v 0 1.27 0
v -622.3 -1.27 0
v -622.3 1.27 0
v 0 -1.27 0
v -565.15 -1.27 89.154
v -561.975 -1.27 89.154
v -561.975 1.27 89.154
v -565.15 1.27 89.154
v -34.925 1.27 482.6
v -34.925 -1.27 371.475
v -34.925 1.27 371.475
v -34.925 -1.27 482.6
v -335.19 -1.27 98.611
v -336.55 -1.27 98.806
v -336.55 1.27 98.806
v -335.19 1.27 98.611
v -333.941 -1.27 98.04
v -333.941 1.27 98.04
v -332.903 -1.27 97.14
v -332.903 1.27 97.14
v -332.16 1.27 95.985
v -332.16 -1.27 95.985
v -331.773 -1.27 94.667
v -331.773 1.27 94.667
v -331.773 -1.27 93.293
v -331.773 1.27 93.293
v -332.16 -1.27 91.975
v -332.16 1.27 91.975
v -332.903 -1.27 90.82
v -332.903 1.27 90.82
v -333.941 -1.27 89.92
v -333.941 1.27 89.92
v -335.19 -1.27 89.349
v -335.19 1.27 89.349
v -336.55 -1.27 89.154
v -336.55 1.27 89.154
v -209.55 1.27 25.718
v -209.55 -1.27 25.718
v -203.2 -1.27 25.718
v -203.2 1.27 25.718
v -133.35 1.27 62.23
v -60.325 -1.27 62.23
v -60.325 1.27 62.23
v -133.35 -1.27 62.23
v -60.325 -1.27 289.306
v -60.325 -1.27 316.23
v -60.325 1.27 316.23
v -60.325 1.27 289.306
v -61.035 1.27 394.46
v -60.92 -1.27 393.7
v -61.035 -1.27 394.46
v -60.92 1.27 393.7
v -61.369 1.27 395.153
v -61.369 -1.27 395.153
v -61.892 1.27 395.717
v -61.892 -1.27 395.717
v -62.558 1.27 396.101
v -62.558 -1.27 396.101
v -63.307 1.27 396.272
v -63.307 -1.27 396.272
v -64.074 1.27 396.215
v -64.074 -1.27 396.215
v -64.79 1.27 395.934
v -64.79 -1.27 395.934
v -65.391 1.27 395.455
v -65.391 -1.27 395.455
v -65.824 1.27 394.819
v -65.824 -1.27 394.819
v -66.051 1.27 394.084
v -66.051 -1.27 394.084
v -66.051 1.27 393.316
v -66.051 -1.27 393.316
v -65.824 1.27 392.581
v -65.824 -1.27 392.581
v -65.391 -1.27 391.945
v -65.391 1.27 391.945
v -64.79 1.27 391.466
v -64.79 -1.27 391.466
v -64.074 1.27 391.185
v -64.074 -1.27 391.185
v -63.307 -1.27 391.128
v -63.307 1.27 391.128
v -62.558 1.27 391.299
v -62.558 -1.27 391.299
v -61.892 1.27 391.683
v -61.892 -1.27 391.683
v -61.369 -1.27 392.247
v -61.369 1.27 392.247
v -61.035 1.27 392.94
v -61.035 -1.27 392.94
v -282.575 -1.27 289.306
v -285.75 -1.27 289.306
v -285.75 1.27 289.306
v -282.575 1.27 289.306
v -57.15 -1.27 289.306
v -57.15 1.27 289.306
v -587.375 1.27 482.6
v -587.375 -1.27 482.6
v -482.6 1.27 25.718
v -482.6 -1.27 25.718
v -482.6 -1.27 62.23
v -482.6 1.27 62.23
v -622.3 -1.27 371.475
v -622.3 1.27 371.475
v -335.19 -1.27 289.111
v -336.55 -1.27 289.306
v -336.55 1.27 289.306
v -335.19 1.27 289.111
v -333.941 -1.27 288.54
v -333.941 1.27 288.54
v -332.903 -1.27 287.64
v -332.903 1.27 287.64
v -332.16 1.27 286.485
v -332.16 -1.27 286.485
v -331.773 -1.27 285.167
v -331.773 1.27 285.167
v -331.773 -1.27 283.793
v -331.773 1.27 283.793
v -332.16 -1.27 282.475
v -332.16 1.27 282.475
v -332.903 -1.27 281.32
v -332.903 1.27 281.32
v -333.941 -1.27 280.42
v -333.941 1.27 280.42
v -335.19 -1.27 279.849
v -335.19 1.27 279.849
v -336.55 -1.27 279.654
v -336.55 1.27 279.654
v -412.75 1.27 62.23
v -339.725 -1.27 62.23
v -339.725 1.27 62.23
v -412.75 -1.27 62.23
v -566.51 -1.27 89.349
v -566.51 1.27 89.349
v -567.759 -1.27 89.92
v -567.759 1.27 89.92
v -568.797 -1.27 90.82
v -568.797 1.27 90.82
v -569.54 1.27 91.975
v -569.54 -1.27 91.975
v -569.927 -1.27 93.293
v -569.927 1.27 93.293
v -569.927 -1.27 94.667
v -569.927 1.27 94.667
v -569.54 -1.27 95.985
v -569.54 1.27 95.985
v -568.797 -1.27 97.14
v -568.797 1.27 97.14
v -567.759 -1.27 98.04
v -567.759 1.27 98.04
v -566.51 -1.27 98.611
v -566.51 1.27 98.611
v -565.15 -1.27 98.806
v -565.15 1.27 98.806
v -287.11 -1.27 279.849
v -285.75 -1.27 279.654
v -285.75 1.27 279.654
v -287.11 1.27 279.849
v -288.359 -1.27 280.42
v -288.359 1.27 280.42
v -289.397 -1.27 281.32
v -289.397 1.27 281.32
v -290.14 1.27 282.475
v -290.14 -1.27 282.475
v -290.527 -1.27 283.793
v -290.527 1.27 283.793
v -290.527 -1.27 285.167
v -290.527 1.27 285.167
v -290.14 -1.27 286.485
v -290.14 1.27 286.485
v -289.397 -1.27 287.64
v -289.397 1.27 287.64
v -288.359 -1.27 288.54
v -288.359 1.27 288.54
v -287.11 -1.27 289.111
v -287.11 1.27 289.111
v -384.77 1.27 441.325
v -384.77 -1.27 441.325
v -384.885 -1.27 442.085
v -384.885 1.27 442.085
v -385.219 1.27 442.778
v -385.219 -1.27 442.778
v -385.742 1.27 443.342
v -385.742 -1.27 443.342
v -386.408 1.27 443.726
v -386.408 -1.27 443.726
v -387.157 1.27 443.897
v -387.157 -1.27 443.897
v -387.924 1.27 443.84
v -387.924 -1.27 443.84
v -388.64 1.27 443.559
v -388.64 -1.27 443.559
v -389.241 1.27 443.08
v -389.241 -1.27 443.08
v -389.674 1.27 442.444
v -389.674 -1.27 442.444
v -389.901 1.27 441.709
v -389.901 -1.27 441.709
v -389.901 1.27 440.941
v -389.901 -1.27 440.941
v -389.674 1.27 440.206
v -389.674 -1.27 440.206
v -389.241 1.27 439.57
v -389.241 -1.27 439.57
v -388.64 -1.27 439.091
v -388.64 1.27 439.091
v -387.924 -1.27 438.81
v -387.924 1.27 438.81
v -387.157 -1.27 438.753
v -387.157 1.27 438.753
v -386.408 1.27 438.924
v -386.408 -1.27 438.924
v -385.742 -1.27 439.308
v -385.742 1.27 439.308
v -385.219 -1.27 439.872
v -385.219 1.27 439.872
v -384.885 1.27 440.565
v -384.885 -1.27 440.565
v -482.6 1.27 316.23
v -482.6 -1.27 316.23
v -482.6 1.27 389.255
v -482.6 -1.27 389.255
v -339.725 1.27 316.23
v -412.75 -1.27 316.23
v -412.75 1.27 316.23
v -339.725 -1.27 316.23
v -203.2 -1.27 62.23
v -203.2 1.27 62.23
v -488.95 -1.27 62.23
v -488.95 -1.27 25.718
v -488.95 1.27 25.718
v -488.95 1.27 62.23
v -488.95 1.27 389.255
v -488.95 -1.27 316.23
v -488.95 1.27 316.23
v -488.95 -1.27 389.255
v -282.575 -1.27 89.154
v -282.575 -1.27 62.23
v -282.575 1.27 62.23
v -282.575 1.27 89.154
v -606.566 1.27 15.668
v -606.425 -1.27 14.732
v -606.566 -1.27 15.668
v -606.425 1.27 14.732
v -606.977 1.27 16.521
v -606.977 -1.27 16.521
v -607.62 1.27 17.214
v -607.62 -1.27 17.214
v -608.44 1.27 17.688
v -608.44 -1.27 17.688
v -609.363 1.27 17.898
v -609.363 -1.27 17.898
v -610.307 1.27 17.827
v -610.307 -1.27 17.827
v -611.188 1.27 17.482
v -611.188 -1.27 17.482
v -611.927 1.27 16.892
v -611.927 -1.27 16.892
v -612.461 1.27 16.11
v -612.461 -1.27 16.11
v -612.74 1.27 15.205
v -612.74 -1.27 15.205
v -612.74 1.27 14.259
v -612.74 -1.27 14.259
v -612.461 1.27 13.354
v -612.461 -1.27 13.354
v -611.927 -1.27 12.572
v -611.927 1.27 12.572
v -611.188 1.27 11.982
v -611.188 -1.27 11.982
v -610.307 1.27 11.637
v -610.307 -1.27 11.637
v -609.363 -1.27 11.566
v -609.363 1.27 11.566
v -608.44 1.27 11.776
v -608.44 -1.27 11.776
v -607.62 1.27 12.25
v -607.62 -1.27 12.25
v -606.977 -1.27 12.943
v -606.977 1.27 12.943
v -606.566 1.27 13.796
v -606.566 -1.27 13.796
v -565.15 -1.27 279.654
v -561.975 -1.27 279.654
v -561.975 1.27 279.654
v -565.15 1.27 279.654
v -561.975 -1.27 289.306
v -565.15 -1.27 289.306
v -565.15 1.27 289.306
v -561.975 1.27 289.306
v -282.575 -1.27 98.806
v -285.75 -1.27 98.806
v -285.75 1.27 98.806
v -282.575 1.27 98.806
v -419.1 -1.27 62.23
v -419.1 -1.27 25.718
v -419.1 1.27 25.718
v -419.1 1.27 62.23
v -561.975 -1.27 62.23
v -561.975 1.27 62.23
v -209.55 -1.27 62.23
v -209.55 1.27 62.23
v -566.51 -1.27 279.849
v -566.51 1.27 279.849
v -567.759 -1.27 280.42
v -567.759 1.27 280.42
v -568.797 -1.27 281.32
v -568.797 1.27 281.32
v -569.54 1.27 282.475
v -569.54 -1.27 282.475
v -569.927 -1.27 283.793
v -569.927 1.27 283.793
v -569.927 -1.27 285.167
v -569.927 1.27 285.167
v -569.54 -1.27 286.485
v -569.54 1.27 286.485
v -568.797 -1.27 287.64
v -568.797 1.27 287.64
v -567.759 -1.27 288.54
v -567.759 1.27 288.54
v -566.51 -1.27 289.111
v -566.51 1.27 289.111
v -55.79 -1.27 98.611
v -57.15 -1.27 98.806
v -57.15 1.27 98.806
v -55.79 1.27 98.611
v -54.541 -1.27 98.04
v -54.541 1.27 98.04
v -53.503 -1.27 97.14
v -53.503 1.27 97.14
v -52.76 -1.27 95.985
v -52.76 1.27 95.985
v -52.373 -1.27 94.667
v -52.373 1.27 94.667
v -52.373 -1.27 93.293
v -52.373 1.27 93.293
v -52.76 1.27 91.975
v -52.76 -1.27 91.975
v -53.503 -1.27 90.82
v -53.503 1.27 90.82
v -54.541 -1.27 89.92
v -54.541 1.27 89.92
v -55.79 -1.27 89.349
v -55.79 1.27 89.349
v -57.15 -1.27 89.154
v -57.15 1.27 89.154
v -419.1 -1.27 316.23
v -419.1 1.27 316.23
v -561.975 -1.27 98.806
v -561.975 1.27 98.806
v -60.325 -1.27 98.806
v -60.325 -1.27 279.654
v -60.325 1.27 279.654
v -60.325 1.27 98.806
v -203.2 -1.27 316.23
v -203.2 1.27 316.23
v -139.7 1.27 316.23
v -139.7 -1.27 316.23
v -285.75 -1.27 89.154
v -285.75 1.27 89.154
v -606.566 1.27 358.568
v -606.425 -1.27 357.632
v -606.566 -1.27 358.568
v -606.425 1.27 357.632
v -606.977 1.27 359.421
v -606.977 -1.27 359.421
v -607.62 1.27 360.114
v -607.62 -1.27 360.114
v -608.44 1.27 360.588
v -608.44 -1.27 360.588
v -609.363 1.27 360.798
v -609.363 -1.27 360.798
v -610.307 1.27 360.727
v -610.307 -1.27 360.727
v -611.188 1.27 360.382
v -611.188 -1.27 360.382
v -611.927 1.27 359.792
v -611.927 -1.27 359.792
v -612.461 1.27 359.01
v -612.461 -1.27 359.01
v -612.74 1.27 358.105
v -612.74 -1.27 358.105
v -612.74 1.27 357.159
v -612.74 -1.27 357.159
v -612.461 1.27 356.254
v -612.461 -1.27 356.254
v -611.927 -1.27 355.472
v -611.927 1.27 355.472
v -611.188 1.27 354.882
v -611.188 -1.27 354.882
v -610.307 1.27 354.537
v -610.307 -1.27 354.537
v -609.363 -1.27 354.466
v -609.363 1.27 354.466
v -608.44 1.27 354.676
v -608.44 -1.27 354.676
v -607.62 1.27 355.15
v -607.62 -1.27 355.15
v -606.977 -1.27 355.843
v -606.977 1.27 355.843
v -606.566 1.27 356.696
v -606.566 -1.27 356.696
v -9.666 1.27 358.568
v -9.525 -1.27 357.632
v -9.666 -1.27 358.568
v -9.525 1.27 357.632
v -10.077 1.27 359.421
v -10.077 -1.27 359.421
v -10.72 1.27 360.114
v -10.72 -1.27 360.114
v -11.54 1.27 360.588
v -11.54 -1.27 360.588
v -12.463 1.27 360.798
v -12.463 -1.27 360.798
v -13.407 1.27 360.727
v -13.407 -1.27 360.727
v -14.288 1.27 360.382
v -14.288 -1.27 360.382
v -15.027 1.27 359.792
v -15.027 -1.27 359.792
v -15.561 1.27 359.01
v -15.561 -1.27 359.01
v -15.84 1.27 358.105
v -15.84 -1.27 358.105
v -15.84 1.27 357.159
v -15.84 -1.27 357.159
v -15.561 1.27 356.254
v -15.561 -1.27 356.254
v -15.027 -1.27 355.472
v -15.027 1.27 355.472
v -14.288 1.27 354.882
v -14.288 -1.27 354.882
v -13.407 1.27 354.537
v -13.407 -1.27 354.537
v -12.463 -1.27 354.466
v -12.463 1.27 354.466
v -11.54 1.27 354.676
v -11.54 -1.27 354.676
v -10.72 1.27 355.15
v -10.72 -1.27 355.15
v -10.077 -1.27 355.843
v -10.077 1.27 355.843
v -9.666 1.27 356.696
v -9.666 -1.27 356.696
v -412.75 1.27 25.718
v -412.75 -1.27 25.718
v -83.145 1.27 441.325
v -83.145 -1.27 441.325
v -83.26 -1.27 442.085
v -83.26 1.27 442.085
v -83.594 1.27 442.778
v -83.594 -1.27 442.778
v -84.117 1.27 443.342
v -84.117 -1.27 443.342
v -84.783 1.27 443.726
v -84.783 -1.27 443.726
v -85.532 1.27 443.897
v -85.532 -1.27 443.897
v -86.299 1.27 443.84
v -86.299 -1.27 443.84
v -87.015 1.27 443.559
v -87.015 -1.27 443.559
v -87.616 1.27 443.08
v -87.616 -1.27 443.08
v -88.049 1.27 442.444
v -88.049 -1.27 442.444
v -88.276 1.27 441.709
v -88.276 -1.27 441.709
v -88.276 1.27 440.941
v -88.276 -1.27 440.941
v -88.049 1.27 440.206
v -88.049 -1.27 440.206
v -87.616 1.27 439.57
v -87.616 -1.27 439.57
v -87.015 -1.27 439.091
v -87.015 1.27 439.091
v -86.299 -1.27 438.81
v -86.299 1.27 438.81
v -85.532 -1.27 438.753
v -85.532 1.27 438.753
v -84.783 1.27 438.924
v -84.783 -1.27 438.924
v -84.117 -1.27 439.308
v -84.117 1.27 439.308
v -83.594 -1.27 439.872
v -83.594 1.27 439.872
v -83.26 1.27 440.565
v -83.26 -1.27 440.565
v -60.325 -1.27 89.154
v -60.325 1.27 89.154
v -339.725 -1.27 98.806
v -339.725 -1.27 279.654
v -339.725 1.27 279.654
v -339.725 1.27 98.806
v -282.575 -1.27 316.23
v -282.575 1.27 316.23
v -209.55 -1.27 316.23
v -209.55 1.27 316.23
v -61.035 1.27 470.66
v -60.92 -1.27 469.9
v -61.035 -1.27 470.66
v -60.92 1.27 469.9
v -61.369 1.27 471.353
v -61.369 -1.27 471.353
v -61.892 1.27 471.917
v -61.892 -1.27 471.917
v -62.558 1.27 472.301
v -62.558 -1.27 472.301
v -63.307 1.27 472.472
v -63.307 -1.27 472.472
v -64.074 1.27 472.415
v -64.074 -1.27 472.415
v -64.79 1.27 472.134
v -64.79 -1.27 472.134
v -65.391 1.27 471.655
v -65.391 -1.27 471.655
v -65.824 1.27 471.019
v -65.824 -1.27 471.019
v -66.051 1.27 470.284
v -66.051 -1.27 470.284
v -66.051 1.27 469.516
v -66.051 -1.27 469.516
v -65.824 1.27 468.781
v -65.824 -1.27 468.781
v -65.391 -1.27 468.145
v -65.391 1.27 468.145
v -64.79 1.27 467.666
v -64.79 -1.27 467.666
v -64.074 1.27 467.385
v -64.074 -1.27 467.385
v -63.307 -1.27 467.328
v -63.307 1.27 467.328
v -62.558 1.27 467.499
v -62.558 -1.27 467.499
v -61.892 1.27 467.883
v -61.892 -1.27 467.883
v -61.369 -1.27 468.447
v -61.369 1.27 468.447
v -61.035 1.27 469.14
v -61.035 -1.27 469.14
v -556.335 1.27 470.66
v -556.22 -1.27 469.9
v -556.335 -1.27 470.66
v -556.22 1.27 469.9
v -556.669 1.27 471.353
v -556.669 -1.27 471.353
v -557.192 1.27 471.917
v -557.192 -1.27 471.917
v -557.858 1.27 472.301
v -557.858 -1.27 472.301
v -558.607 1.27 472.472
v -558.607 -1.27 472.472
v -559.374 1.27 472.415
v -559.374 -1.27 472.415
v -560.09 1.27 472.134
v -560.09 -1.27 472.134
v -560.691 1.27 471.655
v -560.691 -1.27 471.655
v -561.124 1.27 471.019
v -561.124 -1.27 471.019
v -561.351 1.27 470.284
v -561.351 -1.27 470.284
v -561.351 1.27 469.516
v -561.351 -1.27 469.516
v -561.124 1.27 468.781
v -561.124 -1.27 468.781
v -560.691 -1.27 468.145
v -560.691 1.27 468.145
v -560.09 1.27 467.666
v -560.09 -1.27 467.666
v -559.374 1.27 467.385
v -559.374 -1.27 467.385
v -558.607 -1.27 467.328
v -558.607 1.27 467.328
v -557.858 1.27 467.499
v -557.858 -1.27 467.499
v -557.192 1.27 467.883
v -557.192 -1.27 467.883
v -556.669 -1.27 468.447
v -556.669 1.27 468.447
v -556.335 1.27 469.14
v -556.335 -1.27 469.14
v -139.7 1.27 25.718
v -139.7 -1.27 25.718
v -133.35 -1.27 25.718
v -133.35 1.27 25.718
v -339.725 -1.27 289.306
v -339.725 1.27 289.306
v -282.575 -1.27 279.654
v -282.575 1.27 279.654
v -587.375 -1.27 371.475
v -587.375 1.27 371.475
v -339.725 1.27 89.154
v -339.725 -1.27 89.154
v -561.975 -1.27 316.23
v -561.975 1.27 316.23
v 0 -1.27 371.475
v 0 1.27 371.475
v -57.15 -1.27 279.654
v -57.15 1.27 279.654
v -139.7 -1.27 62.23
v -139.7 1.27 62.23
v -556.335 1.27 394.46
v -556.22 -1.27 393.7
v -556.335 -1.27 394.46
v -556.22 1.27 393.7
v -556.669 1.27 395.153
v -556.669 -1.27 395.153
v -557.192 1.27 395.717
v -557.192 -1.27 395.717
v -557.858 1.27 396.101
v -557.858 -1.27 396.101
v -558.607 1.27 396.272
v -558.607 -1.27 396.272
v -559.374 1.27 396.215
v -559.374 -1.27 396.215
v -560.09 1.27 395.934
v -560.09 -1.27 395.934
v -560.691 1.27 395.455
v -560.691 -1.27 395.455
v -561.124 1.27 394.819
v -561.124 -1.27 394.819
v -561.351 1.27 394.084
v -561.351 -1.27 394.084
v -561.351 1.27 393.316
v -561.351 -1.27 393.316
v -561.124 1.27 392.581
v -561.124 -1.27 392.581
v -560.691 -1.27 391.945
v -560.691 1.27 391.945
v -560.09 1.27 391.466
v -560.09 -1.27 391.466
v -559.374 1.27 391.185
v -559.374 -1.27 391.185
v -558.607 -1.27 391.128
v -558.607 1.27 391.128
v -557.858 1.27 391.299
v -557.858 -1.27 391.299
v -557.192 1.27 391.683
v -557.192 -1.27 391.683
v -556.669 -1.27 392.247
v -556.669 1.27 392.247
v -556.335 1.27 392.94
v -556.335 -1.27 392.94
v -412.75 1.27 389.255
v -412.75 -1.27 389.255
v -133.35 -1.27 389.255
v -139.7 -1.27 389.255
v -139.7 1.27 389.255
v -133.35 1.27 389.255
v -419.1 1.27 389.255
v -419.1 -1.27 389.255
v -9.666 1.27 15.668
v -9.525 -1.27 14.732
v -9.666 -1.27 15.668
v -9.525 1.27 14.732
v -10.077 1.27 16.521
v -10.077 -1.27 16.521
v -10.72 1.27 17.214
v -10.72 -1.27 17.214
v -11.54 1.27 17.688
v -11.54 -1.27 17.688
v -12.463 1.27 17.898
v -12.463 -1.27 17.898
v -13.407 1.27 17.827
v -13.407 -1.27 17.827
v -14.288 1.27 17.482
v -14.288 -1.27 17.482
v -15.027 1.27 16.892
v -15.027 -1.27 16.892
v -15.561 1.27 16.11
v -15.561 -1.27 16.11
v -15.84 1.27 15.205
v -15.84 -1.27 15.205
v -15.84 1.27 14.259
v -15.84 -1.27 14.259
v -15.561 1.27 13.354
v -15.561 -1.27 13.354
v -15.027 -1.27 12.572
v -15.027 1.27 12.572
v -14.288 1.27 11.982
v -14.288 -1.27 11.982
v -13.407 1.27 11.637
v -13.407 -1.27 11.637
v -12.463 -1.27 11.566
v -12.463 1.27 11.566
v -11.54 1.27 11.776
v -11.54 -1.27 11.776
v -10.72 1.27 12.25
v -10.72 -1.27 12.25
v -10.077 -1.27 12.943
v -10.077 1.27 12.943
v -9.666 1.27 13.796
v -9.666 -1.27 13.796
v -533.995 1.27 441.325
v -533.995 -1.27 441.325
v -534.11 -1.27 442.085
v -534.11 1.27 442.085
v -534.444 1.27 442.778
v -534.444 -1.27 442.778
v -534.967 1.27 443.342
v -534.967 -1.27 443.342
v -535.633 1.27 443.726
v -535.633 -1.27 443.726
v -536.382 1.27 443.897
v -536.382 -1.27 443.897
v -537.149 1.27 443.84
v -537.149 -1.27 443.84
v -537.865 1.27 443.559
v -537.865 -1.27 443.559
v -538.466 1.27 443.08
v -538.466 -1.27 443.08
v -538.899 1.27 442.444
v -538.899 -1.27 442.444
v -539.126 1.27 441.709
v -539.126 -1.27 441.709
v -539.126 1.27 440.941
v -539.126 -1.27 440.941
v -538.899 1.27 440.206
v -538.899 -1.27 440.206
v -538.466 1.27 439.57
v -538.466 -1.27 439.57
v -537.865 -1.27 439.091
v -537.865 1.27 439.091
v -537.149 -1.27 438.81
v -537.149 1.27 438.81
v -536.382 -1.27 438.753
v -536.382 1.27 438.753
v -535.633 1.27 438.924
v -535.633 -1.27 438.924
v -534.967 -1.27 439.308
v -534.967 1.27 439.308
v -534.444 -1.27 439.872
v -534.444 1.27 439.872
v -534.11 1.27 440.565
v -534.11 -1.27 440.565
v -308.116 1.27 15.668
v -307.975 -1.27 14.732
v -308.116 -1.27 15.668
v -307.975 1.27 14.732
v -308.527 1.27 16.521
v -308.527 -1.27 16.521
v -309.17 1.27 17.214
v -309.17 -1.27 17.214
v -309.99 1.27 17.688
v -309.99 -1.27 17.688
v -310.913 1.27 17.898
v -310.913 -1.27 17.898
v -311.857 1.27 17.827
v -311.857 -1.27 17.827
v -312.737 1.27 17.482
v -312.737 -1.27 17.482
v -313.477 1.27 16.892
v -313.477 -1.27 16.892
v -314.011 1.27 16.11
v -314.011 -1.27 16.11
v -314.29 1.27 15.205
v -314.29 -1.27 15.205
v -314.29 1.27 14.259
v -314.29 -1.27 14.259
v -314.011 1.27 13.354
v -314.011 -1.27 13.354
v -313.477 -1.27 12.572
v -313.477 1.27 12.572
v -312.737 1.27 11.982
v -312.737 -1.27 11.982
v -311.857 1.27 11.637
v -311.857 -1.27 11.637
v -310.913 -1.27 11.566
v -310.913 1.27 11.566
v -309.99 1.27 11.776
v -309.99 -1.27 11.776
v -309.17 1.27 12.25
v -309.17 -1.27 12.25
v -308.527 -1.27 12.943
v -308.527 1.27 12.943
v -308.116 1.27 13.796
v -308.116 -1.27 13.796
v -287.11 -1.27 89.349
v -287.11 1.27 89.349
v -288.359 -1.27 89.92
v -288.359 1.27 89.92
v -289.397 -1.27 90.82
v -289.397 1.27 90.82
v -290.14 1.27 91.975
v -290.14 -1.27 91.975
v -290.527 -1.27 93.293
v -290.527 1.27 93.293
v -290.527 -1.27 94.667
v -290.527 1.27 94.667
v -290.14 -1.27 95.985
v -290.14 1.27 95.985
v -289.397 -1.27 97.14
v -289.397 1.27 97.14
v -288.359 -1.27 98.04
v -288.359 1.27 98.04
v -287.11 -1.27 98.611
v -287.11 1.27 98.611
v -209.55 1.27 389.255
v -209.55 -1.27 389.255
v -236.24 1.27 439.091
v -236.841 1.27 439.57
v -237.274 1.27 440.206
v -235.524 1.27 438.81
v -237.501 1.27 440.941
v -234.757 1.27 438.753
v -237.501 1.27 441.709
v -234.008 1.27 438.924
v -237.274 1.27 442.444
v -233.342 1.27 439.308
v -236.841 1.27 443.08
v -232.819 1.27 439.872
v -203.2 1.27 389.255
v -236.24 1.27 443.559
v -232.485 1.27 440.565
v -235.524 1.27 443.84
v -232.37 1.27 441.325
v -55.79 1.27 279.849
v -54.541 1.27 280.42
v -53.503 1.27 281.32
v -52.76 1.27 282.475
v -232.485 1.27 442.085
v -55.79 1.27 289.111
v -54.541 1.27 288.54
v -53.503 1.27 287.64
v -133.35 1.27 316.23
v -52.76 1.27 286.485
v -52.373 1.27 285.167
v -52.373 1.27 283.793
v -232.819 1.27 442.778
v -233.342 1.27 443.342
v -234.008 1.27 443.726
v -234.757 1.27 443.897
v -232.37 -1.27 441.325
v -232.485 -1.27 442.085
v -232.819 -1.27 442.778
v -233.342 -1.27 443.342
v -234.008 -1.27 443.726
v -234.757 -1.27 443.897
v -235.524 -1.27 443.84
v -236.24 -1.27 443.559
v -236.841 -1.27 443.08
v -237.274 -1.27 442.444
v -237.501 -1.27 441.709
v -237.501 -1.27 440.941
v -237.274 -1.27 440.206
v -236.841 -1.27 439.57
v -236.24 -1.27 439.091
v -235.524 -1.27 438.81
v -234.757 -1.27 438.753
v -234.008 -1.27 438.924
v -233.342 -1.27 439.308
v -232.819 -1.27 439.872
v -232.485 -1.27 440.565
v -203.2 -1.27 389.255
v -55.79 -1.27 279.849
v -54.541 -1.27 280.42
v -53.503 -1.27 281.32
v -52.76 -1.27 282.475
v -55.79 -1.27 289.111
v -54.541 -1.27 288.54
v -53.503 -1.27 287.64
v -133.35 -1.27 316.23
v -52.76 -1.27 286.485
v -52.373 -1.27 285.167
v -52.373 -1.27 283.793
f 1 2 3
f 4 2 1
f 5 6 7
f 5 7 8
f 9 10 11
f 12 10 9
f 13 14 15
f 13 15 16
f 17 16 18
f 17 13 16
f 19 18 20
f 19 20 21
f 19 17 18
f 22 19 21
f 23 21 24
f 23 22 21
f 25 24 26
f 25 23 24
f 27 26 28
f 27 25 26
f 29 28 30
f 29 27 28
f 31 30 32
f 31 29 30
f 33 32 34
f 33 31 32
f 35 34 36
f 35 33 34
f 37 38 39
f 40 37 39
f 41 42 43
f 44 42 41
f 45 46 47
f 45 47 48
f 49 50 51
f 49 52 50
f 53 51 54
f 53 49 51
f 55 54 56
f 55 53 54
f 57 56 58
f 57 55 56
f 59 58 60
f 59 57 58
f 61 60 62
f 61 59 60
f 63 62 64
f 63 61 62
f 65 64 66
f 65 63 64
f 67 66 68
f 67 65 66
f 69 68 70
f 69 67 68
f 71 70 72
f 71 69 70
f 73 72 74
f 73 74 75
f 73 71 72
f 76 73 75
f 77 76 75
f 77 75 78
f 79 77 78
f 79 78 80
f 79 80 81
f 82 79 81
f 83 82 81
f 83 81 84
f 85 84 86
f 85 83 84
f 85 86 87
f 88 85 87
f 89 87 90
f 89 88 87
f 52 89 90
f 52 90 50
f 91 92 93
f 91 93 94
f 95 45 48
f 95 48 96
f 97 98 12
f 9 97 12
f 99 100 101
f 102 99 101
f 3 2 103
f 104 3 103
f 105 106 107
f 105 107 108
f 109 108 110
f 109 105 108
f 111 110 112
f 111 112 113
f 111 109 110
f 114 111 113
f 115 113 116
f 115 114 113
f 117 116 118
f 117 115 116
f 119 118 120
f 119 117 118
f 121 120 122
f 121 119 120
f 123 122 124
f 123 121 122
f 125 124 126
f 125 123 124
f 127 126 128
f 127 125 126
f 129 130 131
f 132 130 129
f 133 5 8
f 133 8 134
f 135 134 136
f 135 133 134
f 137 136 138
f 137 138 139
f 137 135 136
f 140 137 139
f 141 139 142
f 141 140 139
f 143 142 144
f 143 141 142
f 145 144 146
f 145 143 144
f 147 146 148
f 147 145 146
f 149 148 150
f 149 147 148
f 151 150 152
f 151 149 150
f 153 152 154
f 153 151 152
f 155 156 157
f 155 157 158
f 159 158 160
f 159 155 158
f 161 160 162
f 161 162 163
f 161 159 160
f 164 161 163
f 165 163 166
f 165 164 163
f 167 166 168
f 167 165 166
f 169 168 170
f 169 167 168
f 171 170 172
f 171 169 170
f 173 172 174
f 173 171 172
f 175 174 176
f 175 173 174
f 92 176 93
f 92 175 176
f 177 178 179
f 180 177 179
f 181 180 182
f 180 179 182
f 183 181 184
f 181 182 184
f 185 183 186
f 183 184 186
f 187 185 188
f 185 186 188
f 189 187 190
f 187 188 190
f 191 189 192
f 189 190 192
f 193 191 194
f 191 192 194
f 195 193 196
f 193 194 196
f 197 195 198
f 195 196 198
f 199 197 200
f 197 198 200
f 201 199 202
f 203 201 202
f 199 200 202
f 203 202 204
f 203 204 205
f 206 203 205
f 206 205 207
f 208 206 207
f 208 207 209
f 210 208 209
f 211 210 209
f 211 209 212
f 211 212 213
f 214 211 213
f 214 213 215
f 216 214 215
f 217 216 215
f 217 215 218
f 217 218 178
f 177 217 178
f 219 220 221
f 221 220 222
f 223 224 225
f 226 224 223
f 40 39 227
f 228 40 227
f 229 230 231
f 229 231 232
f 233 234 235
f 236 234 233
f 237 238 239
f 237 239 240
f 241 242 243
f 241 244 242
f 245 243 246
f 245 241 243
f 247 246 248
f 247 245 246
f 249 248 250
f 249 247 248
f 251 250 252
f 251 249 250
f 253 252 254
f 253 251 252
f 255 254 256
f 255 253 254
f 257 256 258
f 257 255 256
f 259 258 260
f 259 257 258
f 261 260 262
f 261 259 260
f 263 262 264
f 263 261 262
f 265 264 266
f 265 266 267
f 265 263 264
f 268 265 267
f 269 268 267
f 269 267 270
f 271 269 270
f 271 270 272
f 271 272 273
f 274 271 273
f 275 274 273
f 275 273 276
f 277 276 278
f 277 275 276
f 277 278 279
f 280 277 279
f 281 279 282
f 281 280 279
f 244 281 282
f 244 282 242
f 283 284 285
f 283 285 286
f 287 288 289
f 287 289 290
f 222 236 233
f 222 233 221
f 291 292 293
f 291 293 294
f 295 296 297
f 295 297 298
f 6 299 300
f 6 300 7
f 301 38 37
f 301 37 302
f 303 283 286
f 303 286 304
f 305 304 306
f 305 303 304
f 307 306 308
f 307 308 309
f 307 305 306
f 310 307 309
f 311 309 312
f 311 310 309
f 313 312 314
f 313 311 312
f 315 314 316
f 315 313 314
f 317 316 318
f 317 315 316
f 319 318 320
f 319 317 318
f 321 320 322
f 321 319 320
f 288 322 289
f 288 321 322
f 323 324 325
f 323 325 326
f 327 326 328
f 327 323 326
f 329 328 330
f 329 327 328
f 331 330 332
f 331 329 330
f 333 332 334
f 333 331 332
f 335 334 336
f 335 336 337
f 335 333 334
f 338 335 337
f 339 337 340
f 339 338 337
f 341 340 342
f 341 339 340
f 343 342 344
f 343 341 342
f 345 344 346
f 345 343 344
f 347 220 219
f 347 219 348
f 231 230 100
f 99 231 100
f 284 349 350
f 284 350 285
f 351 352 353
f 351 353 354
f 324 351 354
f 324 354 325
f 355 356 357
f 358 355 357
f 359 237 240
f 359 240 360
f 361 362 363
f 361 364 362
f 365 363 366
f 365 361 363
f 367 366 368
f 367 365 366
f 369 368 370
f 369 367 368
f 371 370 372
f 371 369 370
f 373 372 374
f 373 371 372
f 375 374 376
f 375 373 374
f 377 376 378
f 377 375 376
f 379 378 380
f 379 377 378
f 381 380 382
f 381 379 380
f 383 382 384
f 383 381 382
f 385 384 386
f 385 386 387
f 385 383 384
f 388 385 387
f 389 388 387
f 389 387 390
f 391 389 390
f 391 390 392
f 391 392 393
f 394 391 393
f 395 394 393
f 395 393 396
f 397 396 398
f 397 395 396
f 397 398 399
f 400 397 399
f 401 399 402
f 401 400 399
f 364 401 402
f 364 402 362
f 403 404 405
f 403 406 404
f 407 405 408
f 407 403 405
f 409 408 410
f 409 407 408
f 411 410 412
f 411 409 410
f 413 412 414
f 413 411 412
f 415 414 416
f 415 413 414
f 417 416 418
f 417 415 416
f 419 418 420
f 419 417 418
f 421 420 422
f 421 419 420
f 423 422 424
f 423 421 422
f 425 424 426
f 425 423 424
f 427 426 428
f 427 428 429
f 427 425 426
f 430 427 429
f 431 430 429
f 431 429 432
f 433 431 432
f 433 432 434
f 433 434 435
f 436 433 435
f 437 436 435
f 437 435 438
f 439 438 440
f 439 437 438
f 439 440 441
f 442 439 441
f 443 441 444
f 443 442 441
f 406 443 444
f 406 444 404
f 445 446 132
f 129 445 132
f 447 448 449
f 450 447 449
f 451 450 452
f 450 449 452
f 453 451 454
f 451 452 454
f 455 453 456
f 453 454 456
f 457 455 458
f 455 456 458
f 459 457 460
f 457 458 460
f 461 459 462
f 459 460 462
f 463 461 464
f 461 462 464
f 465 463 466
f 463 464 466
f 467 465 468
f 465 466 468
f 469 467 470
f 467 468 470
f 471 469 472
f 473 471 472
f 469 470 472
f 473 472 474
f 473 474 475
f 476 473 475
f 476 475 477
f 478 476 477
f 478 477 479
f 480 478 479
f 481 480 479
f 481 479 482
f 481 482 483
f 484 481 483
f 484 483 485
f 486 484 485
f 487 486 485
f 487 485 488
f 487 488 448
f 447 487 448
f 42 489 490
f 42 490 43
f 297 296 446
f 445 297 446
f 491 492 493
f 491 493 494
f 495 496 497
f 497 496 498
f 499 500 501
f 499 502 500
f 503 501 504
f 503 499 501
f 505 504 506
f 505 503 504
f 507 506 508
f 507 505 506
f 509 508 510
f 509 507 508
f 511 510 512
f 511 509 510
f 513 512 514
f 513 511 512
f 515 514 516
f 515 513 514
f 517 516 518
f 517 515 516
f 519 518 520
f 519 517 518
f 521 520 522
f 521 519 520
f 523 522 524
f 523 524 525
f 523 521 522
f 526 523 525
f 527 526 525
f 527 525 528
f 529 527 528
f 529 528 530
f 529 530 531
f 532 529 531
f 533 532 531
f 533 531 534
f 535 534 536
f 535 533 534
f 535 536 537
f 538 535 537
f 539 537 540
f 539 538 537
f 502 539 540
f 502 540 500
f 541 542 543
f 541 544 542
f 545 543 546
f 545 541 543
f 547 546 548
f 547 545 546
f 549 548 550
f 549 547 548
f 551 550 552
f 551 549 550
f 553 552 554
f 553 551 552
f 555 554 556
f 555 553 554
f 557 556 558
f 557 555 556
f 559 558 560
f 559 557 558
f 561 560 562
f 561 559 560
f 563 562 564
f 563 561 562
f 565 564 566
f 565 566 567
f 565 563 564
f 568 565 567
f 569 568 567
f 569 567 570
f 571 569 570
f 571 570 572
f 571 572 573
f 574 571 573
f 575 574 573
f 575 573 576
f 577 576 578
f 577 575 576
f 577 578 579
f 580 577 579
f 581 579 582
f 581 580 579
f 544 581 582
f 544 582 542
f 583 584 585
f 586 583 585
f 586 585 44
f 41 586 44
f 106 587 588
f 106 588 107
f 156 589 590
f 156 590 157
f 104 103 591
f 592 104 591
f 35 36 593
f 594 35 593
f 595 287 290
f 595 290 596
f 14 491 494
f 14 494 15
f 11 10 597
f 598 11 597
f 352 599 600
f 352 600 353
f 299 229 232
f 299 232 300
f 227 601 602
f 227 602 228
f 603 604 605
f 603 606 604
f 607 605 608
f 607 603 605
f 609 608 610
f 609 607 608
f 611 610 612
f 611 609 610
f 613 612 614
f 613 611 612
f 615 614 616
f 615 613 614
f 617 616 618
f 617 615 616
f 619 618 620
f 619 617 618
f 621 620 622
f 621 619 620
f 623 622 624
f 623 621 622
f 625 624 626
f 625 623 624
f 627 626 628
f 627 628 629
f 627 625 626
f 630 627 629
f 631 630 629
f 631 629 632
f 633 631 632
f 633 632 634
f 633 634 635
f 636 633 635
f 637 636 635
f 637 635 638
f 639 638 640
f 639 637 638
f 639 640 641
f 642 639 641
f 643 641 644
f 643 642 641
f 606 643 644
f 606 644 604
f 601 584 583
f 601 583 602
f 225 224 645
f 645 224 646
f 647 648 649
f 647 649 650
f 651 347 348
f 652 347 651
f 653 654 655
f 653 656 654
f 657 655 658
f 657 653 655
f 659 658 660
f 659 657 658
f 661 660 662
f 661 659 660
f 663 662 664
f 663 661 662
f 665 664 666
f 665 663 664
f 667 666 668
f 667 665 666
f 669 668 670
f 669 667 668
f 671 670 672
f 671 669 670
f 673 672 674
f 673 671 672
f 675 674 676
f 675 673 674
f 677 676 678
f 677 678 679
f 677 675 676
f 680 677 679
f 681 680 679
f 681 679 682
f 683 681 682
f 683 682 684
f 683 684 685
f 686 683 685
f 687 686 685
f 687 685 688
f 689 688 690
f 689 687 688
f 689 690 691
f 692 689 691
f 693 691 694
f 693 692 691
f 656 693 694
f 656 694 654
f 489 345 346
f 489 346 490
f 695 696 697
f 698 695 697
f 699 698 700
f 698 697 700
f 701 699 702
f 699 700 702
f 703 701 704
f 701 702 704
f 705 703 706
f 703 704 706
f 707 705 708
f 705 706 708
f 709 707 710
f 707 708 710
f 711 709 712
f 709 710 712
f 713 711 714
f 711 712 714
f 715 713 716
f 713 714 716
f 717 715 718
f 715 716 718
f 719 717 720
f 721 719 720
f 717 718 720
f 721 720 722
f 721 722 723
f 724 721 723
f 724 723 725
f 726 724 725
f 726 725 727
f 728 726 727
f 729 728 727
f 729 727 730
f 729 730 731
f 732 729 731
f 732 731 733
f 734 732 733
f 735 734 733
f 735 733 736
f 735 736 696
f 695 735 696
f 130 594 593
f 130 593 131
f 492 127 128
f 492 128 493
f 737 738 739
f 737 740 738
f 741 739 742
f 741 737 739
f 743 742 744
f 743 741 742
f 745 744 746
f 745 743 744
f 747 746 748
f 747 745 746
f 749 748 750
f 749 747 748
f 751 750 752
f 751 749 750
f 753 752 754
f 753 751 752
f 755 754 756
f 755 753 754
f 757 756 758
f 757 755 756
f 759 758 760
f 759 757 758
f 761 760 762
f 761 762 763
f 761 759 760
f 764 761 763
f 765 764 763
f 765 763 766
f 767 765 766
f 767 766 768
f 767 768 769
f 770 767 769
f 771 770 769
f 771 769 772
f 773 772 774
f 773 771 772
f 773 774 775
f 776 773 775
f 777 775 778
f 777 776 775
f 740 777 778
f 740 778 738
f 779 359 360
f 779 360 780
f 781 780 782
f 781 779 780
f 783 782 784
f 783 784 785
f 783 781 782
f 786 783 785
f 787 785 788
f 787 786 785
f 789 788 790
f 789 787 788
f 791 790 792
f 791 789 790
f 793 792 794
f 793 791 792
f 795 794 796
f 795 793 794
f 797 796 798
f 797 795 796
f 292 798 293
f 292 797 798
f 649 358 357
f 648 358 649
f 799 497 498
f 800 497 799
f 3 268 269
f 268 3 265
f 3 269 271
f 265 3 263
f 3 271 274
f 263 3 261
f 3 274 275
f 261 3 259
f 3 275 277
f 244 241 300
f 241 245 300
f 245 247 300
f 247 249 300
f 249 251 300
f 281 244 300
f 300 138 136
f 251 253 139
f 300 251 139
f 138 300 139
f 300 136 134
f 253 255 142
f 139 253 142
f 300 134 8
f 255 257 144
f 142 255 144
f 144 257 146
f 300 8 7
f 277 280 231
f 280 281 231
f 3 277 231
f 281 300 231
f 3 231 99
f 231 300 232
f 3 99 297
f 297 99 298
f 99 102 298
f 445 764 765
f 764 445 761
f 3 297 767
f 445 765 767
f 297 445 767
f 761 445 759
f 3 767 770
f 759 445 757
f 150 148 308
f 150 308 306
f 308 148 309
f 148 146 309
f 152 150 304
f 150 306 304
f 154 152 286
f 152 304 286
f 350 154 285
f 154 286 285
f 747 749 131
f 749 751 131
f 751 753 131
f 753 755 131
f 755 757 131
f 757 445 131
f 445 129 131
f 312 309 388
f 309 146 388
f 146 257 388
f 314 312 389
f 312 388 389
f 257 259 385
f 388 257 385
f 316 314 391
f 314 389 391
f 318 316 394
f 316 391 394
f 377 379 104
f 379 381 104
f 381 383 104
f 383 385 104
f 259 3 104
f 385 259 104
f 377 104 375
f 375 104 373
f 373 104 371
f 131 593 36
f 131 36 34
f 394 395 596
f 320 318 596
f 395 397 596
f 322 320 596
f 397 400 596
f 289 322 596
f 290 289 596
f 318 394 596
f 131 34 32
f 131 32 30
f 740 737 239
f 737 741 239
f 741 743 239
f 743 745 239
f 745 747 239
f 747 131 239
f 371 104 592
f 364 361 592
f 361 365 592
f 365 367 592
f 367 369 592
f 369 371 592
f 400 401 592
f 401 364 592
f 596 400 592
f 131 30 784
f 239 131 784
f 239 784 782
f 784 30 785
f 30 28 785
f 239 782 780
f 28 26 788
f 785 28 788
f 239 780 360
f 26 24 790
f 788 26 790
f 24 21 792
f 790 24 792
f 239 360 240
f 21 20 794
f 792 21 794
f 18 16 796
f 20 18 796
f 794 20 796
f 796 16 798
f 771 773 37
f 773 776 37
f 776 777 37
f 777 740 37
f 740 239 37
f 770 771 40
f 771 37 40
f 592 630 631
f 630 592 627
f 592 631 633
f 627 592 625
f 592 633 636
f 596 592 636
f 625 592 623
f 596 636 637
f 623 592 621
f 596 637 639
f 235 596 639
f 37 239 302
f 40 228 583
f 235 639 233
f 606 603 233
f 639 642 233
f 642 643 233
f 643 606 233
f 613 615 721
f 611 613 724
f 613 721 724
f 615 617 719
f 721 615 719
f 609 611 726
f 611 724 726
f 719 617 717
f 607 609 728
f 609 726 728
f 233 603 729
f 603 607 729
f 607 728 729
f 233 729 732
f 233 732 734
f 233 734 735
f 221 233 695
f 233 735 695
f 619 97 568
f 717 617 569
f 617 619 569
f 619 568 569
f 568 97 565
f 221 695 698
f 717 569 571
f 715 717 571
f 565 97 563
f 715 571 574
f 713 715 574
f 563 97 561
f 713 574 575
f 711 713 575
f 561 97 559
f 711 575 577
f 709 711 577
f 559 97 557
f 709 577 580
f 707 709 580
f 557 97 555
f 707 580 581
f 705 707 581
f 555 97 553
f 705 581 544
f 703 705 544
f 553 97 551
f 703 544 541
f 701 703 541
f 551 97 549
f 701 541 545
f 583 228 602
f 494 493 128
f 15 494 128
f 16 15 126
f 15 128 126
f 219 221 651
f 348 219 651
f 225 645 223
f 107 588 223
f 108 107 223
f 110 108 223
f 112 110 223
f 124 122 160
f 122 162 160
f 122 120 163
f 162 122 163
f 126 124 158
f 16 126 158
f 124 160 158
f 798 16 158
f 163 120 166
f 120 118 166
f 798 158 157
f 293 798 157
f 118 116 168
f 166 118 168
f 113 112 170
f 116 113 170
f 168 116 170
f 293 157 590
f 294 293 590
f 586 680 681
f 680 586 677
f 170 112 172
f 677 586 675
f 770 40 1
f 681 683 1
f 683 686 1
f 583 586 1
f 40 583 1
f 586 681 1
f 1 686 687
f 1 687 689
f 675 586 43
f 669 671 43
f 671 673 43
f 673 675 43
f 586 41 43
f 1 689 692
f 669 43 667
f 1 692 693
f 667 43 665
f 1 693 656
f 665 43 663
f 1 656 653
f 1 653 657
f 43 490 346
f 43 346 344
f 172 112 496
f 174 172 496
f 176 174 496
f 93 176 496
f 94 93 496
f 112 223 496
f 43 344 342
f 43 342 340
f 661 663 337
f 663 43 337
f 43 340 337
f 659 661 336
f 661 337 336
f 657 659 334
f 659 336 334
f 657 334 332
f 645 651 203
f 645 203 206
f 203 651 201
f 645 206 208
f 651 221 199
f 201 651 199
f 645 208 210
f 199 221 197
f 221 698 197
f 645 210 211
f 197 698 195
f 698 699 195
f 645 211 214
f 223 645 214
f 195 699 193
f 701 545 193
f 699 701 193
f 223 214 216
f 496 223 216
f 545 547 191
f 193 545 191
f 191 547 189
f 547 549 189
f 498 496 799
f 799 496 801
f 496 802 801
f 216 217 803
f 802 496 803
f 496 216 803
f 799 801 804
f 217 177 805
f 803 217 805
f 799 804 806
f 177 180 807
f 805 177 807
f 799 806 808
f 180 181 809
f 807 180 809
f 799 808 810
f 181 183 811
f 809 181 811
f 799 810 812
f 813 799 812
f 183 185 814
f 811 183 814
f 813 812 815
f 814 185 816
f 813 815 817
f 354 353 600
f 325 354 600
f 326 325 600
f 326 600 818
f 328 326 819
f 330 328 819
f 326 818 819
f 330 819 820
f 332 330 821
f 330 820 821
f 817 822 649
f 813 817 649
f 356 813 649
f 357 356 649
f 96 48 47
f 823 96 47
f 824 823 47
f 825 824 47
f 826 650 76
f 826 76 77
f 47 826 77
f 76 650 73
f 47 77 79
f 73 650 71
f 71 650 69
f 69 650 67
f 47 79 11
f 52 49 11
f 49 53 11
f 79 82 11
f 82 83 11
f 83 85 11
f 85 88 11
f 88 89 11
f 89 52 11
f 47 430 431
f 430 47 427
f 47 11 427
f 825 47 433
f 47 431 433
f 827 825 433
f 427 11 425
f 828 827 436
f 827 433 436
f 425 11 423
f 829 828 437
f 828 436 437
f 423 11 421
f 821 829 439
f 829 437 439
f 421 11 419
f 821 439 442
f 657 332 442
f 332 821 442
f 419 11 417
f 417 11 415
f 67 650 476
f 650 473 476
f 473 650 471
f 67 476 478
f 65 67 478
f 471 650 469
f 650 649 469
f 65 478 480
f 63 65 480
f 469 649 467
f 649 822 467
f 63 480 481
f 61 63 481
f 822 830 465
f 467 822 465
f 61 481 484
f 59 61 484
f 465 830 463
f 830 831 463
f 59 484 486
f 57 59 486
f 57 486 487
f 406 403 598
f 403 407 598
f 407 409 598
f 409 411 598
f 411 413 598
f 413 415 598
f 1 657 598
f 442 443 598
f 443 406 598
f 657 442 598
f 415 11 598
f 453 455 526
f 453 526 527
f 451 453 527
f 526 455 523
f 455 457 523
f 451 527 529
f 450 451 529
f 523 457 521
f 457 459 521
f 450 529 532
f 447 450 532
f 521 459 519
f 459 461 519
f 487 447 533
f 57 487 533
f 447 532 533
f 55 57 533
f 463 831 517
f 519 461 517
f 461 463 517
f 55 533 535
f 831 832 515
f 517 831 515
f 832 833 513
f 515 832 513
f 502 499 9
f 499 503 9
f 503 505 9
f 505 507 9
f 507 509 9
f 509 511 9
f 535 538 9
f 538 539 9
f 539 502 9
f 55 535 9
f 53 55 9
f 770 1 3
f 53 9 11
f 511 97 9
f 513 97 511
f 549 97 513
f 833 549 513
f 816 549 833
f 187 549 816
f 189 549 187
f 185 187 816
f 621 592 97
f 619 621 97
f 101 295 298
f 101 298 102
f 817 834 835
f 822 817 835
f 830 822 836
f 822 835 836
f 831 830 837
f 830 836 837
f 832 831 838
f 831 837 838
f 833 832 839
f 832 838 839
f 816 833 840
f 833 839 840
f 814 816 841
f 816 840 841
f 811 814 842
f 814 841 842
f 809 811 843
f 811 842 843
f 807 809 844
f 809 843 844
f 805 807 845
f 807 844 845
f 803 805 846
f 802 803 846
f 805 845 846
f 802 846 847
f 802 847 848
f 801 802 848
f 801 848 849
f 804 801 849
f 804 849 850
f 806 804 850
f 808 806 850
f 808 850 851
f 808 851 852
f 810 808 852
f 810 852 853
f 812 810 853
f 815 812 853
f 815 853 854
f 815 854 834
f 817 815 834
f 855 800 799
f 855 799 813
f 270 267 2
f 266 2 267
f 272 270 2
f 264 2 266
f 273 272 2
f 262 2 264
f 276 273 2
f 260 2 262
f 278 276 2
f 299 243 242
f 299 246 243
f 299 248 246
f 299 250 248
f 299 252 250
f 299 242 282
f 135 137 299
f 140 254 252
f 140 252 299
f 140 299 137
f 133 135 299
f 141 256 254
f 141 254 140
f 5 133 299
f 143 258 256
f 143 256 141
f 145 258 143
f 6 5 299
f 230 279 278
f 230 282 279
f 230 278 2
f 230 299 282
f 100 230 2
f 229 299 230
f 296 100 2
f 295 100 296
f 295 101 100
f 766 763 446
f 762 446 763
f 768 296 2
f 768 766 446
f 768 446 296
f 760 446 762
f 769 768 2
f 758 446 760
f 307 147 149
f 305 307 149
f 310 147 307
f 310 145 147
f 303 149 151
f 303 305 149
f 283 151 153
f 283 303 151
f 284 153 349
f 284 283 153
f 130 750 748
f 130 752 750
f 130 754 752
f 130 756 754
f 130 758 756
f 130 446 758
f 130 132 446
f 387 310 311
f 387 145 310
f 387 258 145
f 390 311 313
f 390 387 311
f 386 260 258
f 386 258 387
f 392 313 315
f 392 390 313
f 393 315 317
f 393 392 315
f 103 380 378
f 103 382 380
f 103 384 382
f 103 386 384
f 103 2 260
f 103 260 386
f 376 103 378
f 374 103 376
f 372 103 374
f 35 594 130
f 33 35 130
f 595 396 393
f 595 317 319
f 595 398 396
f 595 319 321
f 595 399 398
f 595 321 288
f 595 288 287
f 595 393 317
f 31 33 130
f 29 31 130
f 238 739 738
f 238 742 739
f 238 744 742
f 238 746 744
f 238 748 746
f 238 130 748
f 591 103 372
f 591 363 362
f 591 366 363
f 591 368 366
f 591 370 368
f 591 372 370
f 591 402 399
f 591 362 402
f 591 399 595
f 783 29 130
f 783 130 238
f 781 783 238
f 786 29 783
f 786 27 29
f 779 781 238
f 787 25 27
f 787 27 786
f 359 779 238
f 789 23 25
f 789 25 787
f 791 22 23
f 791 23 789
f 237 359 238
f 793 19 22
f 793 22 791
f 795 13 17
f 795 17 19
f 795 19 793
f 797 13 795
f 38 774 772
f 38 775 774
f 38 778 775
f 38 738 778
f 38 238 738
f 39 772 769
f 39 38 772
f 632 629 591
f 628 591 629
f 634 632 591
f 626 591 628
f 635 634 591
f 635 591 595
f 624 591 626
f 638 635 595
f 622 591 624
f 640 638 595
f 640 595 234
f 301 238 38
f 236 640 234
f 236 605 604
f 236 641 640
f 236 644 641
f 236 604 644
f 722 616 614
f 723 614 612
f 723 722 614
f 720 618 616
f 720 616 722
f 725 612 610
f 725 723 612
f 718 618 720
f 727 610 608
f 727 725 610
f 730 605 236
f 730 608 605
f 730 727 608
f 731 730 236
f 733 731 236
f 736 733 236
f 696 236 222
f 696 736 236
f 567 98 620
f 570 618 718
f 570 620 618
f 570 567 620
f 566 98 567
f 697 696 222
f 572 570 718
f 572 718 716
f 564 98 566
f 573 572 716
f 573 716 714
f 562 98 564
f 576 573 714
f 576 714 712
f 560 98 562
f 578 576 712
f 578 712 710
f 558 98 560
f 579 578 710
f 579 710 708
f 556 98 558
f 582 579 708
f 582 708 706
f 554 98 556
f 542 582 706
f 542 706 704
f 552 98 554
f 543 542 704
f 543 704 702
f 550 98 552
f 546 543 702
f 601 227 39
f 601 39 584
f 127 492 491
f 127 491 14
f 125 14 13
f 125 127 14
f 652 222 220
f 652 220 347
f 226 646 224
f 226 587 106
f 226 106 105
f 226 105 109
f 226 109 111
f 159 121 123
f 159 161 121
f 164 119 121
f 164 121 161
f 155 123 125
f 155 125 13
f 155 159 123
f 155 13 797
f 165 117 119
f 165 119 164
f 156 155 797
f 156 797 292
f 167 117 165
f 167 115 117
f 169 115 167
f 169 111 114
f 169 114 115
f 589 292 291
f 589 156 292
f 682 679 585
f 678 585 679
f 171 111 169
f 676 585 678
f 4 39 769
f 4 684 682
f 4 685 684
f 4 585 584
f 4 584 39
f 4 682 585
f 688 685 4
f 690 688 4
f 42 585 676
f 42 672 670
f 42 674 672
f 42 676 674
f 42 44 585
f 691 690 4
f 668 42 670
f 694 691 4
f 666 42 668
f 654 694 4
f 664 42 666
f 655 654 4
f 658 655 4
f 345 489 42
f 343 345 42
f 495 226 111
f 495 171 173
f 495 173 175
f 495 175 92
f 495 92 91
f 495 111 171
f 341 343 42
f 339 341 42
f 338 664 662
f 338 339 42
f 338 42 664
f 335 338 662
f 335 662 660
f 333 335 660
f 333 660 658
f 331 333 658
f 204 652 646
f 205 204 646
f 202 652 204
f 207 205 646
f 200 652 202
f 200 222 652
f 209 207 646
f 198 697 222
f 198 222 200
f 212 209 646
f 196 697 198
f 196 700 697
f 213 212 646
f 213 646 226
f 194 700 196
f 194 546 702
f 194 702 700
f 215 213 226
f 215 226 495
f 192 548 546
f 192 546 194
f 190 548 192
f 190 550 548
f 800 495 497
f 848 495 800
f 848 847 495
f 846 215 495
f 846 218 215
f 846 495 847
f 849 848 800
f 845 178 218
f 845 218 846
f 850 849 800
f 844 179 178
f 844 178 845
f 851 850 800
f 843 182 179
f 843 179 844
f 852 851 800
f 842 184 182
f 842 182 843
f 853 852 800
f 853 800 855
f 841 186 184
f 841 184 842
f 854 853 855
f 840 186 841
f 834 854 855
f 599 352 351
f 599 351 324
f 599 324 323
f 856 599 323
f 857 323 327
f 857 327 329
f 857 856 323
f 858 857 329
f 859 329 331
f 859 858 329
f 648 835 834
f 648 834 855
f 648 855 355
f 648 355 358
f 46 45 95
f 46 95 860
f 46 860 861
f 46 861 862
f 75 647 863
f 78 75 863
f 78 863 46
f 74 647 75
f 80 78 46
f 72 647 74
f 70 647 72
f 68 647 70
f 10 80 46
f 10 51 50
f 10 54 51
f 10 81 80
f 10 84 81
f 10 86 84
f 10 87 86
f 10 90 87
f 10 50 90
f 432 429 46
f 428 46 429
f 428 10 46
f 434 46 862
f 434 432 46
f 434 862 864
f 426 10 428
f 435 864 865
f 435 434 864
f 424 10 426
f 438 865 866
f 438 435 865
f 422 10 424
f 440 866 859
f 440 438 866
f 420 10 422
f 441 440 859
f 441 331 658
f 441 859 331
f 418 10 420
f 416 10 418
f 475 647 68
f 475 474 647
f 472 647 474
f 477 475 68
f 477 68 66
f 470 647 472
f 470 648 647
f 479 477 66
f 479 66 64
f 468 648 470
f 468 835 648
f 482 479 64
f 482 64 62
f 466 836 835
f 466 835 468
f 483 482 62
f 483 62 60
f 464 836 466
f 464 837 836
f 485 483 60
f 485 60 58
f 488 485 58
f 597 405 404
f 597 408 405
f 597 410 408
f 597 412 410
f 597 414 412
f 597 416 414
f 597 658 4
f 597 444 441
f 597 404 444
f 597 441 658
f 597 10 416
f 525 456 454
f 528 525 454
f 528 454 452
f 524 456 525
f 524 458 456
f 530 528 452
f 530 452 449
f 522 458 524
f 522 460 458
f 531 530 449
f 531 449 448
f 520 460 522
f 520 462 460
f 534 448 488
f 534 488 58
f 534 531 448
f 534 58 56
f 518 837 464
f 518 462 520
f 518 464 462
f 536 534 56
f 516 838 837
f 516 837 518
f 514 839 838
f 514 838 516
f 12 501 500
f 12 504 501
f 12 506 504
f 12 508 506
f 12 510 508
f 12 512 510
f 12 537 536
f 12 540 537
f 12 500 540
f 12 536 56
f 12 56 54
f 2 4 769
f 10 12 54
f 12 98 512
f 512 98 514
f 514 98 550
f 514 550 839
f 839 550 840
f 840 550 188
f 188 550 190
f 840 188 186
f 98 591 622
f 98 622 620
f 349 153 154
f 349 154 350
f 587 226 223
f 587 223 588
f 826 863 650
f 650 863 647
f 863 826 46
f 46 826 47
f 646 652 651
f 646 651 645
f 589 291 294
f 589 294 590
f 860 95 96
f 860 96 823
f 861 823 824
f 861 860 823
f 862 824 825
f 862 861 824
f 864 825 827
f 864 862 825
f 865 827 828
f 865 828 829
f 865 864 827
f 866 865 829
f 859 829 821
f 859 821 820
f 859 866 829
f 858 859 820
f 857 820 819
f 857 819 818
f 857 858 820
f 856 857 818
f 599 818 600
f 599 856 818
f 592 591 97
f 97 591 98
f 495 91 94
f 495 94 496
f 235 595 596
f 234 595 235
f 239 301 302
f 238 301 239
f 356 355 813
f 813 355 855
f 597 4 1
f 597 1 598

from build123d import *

# Parameters (mm, degrees)
F0_W     = 622.3
F0_H     = 482.6
F0_R     = 3.175
F0_R_2   = 2.579688
F1_DEPTH = 1.27
F2_W     = 34.925
F2_H     = 111.125
F2_W_2   = 6.35
F2_H_2   = 73.025
F2_H_3   = 36.5125
F2_R     = 2.579688
F3_DEPTH = 2.541


with BuildPart() as f1:
    # F0 (on Front) → F1 (new body, symmetric)
    with BuildSketch(Plane.XZ):
        with Locations((-311.15, 241.3)):
            Rectangle(F0_W, F0_H)
        with Locations((-609.6, 14.732)):
            Circle(F0_R, mode=Mode.SUBTRACT)
        with BuildLine():
            Line((-561.975, 289.306), (-561.975, 316.23))
            Line((-561.975, 316.23), (-339.725, 316.23))
            Line((-339.725, 316.23), (-339.725, 289.306))
            Line((-339.725, 289.306), (-336.55, 289.306))
            ThreePointArc((-336.55, 289.306), (-331.724, 284.48), (-336.55, 279.654))
            Line((-336.55, 279.654), (-339.725, 279.654))
            Line((-339.725, 279.654), (-339.725, 98.806))
            Line((-339.725, 98.806), (-336.55, 98.806))
            ThreePointArc((-336.55, 98.806), (-331.724, 93.98), (-336.55, 89.154))
            Line((-336.55, 89.154), (-339.725, 89.154))
            Line((-339.725, 89.154), (-339.725, 62.23))
            Line((-339.725, 62.23), (-561.975, 62.23))
            Line((-561.975, 62.23), (-561.975, 89.154))
            Line((-561.975, 89.154), (-565.15, 89.154))
            ThreePointArc((-565.15, 89.154), (-569.976, 93.98), (-565.15, 98.806))
            Line((-565.15, 98.806), (-561.975, 98.806))
            Line((-561.975, 98.806), (-561.975, 279.654))
            Line((-561.975, 279.654), (-565.15, 279.654))
            ThreePointArc((-565.15, 279.654), (-569.976, 284.48), (-565.15, 289.306))
            Line((-565.15, 289.306), (-561.975, 289.306))
        make_face(mode=Mode.SUBTRACT)
        with Locations((-311.15, 14.732)):
            Circle(F0_R, mode=Mode.SUBTRACT)
        with Locations((-12.7, 14.732)):
            Circle(F0_R, mode=Mode.SUBTRACT)
        with BuildLine():
            Line((-282.575, 62.23), (-282.575, 89.154))
            Line((-282.575, 89.154), (-285.75, 89.154))
            ThreePointArc((-285.75, 89.154), (-290.576, 93.98), (-285.75, 98.806))
            Line((-285.75, 98.806), (-282.575, 98.806))
            Line((-282.575, 98.806), (-282.575, 279.654))
            Line((-282.575, 279.654), (-285.75, 279.654))
            ThreePointArc((-285.75, 279.654), (-290.576, 284.48), (-285.75, 289.306))
            Line((-285.75, 289.306), (-282.575, 289.306))
            Line((-282.575, 289.306), (-282.575, 316.23))
            Line((-282.575, 316.23), (-60.325, 316.23))
            Line((-60.325, 316.23), (-60.325, 289.306))
            Line((-60.325, 289.306), (-57.15, 289.306))
            ThreePointArc((-57.15, 289.306), (-52.324, 284.48), (-57.15, 279.654))
            Line((-57.15, 279.654), (-60.325, 279.654))
            Line((-60.325, 279.654), (-60.325, 98.806))
            Line((-60.325, 98.806), (-57.15, 98.806))
            ThreePointArc((-57.15, 98.806), (-52.324, 93.98), (-57.15, 89.154))
            Line((-57.15, 89.154), (-60.325, 89.154))
            Line((-60.325, 89.154), (-60.325, 62.23))
            Line((-60.325, 62.23), (-282.575, 62.23))
        make_face(mode=Mode.SUBTRACT)
        with Locations((-609.6, 357.632)):
            Circle(F0_R, mode=Mode.SUBTRACT)
        with Locations((-558.8, 393.7)):
            Circle(F0_R_2, mode=Mode.SUBTRACT)
        with Locations((-558.8, 469.9)):
            Circle(F0_R_2, mode=Mode.SUBTRACT)
        with Locations((-12.7, 357.632)):
            Circle(F0_R, mode=Mode.SUBTRACT)
        with Locations((-63.5, 393.7)):
            Circle(F0_R_2, mode=Mode.SUBTRACT)
        with Locations((-63.5, 469.9)):
            Circle(F0_R_2, mode=Mode.SUBTRACT)
    extrude(amount=F1_DEPTH, both=True)

    # F2 (on face) → F3 (cut, through all)
    with BuildSketch(Plane.XZ.offset(1.27)):
        with Locations((-604.8375, 427.0375)):
            Rectangle(F2_W, F2_H)
        with Locations((-17.4625, 427.0375)):
            Rectangle(F2_W, F2_H)
        with Locations((-485.775, 352.7425)):
            Rectangle(F2_W_2, F2_H_2)
        with Locations((-415.925, 352.7425)):
            Rectangle(F2_W_2, F2_H_2)
        with Locations((-415.925, 43.97375)):
            Rectangle(F2_W_2, F2_H_3)
        with Locations((-485.775, 43.97375)):
            Rectangle(F2_W_2, F2_H_3)
        with Locations((-206.375, 352.7425)):
            Rectangle(F2_W_2, F2_H_2)
        with Locations((-136.525, 43.97375)):
            Rectangle(F2_W_2, F2_H_3)
        with Locations((-136.525, 352.7425)):
            Rectangle(F2_W_2, F2_H_2)
        with Locations((-206.375, 43.97375)):
            Rectangle(F2_W_2, F2_H_3)
        with Locations((-85.725, 441.325)):
            Circle(F2_R)
        with Locations((-536.575, 441.325)):
            Circle(F2_R)
        with Locations((-234.95, 441.325)):
            Circle(F2_R)
        with Locations((-387.35, 441.325)):
            Circle(F2_R)
    extrude(amount=-F3_DEPTH, mode=Mode.SUBTRACT)


solid = f1.part
